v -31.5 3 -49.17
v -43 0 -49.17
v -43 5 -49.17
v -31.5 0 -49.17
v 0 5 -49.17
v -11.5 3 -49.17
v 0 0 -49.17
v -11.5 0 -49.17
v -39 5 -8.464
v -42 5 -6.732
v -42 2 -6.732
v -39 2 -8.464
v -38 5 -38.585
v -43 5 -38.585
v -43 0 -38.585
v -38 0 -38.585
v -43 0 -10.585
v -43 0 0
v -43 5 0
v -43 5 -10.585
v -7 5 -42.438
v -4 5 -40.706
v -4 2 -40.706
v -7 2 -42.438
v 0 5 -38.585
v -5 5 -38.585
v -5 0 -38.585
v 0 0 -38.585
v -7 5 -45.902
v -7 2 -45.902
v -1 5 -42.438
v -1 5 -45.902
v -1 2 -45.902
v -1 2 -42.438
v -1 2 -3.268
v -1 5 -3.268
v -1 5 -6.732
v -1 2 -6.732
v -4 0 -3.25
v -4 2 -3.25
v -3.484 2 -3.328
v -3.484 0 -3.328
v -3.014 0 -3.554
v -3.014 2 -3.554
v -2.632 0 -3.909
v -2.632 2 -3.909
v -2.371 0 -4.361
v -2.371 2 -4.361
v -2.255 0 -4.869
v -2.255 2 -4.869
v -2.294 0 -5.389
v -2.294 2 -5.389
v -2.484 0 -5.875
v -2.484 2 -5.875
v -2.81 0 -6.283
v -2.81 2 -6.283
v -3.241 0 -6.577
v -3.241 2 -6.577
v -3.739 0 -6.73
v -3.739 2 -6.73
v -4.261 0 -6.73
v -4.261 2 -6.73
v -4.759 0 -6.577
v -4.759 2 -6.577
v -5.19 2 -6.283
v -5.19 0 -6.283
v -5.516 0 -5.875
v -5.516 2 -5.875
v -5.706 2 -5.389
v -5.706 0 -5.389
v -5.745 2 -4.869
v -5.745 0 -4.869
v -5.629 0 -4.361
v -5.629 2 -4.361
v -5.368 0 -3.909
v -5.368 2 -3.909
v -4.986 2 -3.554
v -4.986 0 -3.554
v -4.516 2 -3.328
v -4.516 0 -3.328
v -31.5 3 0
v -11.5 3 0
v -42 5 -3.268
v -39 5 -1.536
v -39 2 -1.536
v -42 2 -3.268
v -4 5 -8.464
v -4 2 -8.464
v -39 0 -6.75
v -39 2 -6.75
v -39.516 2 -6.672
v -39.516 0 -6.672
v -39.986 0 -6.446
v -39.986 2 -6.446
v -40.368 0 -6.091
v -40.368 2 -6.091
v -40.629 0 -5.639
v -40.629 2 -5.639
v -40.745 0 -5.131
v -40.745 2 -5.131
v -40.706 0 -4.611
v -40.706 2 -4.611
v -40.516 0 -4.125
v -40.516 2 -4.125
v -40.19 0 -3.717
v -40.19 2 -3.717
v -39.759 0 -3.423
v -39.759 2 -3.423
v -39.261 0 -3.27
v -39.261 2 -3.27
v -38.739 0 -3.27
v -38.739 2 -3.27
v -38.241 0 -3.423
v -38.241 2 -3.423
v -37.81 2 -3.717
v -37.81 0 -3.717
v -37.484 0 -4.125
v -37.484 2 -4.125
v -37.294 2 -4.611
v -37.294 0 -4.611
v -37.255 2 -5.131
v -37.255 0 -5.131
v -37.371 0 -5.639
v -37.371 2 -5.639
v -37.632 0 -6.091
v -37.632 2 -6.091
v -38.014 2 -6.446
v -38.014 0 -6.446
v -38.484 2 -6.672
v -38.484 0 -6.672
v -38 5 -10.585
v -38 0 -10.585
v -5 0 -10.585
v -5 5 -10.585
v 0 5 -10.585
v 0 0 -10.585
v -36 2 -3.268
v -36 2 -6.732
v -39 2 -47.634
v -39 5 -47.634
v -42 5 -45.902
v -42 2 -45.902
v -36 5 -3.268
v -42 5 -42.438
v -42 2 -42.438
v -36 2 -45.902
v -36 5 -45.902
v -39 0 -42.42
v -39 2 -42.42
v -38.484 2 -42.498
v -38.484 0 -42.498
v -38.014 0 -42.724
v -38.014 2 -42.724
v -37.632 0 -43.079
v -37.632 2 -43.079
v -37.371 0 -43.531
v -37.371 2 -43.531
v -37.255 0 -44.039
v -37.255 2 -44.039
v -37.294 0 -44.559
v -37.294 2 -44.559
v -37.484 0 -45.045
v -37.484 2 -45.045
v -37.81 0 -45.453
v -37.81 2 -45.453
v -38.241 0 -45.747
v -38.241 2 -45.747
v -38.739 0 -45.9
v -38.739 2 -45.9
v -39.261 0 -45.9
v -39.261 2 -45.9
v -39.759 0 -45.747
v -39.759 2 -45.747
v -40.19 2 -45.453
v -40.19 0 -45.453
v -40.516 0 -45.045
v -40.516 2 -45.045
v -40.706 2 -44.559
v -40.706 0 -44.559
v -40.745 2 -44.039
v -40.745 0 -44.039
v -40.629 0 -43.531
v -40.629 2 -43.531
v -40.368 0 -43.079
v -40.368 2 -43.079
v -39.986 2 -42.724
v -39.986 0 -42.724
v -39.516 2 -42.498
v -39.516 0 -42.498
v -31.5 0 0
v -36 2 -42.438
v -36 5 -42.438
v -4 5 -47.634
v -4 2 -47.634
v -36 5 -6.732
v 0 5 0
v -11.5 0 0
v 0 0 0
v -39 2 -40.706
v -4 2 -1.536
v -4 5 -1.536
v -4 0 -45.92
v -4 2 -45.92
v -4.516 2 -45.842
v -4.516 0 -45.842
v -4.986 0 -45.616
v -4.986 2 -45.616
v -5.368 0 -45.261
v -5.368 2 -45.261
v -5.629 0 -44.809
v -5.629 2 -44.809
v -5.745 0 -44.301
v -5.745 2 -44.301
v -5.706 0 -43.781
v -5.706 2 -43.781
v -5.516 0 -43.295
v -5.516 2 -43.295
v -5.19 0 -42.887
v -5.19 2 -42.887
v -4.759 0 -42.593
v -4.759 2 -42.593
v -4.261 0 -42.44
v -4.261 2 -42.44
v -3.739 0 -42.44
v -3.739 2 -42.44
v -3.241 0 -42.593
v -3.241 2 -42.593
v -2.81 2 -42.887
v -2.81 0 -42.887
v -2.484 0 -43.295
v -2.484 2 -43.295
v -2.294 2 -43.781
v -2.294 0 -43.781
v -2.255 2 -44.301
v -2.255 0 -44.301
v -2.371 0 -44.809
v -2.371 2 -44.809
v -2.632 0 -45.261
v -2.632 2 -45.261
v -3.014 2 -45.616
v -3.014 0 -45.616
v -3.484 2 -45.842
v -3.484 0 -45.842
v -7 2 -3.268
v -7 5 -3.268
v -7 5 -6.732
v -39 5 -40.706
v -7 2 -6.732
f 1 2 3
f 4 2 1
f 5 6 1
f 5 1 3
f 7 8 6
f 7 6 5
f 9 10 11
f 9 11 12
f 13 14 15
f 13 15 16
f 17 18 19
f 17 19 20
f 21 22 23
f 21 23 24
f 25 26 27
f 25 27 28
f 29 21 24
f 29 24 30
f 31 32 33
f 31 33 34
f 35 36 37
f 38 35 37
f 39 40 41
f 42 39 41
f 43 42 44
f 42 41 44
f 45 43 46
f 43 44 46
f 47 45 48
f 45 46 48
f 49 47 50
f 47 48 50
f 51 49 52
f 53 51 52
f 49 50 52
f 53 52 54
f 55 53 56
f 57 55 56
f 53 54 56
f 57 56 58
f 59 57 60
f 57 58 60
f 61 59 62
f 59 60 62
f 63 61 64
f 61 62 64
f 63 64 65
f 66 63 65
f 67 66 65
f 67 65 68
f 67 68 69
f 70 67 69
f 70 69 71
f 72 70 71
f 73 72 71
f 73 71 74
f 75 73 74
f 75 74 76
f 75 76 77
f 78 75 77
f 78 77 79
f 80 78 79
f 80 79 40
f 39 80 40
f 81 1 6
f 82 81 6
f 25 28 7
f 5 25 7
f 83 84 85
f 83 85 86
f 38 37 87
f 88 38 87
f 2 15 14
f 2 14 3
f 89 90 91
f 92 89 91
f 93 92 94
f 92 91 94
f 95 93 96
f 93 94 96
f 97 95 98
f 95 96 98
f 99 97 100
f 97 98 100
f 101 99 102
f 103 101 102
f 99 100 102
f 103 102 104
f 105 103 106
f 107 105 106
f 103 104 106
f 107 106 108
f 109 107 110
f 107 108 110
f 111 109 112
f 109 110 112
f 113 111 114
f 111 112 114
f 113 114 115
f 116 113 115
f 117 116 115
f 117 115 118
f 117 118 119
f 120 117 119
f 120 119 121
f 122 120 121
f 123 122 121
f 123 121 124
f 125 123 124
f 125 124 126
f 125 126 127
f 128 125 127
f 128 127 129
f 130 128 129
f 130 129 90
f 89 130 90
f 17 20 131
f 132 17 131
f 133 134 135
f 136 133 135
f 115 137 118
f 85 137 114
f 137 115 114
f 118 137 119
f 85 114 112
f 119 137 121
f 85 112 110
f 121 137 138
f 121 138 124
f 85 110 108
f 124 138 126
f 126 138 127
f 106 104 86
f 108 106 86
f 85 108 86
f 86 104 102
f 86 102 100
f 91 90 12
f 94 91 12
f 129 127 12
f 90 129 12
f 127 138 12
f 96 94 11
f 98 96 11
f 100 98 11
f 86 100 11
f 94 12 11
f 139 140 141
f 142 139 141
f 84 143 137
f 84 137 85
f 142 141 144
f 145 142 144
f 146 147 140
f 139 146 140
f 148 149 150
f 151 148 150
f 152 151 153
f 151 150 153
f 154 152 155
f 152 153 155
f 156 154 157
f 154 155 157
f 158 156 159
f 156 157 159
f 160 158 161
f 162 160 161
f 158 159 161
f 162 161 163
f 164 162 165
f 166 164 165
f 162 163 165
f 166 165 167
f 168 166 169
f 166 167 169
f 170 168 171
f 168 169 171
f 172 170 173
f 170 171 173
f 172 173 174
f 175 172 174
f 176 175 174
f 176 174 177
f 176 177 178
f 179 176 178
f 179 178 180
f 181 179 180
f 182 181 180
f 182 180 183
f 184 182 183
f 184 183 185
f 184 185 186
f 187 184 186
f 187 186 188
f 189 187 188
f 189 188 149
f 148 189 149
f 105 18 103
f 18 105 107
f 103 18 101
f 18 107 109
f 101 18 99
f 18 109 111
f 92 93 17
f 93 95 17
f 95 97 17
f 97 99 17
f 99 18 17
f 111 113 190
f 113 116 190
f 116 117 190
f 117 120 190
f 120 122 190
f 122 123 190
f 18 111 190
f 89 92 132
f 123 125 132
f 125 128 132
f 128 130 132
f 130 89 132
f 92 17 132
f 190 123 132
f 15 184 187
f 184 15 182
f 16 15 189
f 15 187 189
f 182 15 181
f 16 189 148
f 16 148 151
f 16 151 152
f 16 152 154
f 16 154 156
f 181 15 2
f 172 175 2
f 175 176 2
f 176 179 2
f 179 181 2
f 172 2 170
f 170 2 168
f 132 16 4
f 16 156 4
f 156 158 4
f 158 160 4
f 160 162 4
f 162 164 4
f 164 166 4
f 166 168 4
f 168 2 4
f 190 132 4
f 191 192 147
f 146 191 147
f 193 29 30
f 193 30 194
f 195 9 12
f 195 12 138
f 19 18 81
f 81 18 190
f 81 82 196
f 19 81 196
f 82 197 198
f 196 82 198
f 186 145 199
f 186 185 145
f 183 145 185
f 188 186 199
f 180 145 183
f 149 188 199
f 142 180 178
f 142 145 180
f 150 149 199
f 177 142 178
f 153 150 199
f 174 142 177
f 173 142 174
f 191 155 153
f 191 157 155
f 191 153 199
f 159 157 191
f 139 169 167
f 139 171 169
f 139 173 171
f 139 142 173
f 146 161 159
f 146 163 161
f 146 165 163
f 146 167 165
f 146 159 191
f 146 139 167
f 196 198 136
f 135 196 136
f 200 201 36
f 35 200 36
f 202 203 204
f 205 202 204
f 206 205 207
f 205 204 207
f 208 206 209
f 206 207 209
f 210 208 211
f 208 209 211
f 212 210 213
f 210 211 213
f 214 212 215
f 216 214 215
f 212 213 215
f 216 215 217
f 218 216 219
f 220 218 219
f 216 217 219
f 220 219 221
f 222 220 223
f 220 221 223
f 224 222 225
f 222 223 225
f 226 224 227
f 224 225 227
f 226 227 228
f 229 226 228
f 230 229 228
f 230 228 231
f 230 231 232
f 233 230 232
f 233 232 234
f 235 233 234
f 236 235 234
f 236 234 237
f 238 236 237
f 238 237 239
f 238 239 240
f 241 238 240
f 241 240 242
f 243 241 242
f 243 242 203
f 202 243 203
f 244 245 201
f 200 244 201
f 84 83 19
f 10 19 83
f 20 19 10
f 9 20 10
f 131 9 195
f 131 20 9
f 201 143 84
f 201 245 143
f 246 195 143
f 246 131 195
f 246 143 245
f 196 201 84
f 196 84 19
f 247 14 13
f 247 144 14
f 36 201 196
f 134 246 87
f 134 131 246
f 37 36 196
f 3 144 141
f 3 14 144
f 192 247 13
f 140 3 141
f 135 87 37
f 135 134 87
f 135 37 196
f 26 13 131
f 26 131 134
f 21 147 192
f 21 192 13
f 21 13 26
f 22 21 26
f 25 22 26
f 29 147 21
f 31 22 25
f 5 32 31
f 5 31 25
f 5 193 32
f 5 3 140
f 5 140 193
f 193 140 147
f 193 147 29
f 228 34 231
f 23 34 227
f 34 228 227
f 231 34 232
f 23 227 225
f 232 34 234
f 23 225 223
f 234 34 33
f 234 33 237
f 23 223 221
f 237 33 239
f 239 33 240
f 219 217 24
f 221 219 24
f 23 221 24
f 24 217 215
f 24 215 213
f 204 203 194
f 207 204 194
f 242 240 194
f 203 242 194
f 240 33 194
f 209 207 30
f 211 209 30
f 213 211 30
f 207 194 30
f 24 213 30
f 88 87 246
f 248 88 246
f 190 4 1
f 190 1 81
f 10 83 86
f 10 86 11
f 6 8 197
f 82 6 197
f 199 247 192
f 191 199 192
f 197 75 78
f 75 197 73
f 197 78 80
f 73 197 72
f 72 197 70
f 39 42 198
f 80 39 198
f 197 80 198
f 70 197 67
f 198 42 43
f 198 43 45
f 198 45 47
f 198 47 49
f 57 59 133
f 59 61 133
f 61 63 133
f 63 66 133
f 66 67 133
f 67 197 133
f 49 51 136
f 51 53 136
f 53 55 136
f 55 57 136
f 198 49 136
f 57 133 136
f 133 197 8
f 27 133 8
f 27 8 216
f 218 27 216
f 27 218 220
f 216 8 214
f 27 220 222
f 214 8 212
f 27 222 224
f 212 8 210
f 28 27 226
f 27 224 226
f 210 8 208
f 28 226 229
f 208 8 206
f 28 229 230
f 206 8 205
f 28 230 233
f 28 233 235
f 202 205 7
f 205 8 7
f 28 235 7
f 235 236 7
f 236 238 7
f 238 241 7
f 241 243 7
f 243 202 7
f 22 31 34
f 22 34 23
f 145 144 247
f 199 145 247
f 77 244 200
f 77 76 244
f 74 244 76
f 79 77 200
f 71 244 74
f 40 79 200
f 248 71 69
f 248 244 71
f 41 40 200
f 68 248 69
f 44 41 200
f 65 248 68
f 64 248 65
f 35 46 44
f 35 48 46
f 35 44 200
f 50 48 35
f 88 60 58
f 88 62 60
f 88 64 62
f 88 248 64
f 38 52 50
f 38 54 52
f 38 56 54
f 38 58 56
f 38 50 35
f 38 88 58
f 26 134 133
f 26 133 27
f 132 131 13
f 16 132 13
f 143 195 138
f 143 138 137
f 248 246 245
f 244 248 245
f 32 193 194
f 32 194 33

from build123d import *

# Parameters (mm, degrees)
SKETCH1_W           = 43
SKETCH1_H           = 49.17
BOSS_EXTRUDE1_DEPTH = 5
CUT_EXTRUDE1_DEPTH  = 3
SKETCH4_R           = 1.75
CUT_EXTRUDE2_DEPTH  = 66.388752091
SKETCH5_W           = 5
SKETCH5_H           = 28
CUT_EXTRUDE3_DEPTH  = 66.510983049
SKETCH7_W           = 20
SKETCH7_H           = 49.17
CUT_EXTRUDE4_DEPTH  = 3


with BuildPart() as part:
    # Sketch1 → Boss-Extrude1 (new body)
    with BuildSketch(Plane(origin=(0, 0, 0), x_dir=(1, 0, 0), z_dir=(0, 1, 0))):
        with Locations((-21.5, 24.585)):
            Rectangle(SKETCH1_W, SKETCH1_H)
    extrude(amount=BOSS_EXTRUDE1_DEPTH)

    # Sketch2 → Cut-Extrude1 (cut)
    with BuildSketch(Plane(origin=(0, 5, 0), x_dir=(1, 0, 0), z_dir=(0, 1, 0))):
        Polygon((-1, 42.437949192), (-4, 40.705898385), (-7, 42.437949192), (-7, 45.902050808), (-4, 47.634101615), (-1, 45.902050808), align=None)
        Polygon((-4, 8.464101615), (-7, 6.732050808), (-7, 3.267949192), (-4, 1.535898385), (-1, 3.267949192), (-1, 6.732050808), align=None)
        Polygon((-42, 6.732050808), (-39, 8.464101615), (-36, 6.732050808), (-36, 3.267949192), (-39, 1.535898385), (-42, 3.267949192), align=None)
        Polygon((-42, 45.902050808), (-42, 42.437949192), (-39, 40.705898385), (-36, 42.437949192), (-36, 45.902050808), (-39, 47.634101615), align=None)
    extrude(amount=-CUT_EXTRUDE1_DEPTH, mode=Mode.SUBTRACT)

    # Sketch4 → Cut-Extrude2 (cut, through all)
    with BuildSketch(Plane(origin=(0, 2, 0), x_dir=(1, 0, 0), z_dir=(0, 1, 0))):
        with Locations(Location((-39, 44.17, 0), (0, 0, 270))):
            Circle(SKETCH4_R)
        with Locations(Location((-39, 5, 0), (0, 0, 90))):
            Circle(SKETCH4_R)
        with Locations(Location((-4, 5, 0), (0, 0, 270))):
            Circle(SKETCH4_R)
        with Locations(Location((-4, 44.17, 0), (0, 0, 90))):
            Circle(SKETCH4_R)
    extrude(amount=-CUT_EXTRUDE2_DEPTH, mode=Mode.SUBTRACT)

    # Sketch5 → Cut-Extrude3 (cut, through all)
    with BuildSketch(Plane(origin=(0, 5, 0), x_dir=(1, 0, 0), z_dir=(0, 1, 0))):
        with Locations((-2.5, 24.585)):
            Rectangle(SKETCH5_W, SKETCH5_H)
        with Locations((-40.5, 24.585)):
            Rectangle(SKETCH5_W, SKETCH5_H)
    extrude(amount=-CUT_EXTRUDE3_DEPTH, mode=Mode.SUBTRACT)

    # Sketch7 → Cut-Extrude4 (cut)
    with BuildSketch(Plane.XZ):
        with Locations((-21.5, -24.585)):
            Rectangle(SKETCH7_W, SKETCH7_H)
    extrude(amount=-CUT_EXTRUDE4_DEPTH, mode=Mode.SUBTRACT)


solid = part.part
